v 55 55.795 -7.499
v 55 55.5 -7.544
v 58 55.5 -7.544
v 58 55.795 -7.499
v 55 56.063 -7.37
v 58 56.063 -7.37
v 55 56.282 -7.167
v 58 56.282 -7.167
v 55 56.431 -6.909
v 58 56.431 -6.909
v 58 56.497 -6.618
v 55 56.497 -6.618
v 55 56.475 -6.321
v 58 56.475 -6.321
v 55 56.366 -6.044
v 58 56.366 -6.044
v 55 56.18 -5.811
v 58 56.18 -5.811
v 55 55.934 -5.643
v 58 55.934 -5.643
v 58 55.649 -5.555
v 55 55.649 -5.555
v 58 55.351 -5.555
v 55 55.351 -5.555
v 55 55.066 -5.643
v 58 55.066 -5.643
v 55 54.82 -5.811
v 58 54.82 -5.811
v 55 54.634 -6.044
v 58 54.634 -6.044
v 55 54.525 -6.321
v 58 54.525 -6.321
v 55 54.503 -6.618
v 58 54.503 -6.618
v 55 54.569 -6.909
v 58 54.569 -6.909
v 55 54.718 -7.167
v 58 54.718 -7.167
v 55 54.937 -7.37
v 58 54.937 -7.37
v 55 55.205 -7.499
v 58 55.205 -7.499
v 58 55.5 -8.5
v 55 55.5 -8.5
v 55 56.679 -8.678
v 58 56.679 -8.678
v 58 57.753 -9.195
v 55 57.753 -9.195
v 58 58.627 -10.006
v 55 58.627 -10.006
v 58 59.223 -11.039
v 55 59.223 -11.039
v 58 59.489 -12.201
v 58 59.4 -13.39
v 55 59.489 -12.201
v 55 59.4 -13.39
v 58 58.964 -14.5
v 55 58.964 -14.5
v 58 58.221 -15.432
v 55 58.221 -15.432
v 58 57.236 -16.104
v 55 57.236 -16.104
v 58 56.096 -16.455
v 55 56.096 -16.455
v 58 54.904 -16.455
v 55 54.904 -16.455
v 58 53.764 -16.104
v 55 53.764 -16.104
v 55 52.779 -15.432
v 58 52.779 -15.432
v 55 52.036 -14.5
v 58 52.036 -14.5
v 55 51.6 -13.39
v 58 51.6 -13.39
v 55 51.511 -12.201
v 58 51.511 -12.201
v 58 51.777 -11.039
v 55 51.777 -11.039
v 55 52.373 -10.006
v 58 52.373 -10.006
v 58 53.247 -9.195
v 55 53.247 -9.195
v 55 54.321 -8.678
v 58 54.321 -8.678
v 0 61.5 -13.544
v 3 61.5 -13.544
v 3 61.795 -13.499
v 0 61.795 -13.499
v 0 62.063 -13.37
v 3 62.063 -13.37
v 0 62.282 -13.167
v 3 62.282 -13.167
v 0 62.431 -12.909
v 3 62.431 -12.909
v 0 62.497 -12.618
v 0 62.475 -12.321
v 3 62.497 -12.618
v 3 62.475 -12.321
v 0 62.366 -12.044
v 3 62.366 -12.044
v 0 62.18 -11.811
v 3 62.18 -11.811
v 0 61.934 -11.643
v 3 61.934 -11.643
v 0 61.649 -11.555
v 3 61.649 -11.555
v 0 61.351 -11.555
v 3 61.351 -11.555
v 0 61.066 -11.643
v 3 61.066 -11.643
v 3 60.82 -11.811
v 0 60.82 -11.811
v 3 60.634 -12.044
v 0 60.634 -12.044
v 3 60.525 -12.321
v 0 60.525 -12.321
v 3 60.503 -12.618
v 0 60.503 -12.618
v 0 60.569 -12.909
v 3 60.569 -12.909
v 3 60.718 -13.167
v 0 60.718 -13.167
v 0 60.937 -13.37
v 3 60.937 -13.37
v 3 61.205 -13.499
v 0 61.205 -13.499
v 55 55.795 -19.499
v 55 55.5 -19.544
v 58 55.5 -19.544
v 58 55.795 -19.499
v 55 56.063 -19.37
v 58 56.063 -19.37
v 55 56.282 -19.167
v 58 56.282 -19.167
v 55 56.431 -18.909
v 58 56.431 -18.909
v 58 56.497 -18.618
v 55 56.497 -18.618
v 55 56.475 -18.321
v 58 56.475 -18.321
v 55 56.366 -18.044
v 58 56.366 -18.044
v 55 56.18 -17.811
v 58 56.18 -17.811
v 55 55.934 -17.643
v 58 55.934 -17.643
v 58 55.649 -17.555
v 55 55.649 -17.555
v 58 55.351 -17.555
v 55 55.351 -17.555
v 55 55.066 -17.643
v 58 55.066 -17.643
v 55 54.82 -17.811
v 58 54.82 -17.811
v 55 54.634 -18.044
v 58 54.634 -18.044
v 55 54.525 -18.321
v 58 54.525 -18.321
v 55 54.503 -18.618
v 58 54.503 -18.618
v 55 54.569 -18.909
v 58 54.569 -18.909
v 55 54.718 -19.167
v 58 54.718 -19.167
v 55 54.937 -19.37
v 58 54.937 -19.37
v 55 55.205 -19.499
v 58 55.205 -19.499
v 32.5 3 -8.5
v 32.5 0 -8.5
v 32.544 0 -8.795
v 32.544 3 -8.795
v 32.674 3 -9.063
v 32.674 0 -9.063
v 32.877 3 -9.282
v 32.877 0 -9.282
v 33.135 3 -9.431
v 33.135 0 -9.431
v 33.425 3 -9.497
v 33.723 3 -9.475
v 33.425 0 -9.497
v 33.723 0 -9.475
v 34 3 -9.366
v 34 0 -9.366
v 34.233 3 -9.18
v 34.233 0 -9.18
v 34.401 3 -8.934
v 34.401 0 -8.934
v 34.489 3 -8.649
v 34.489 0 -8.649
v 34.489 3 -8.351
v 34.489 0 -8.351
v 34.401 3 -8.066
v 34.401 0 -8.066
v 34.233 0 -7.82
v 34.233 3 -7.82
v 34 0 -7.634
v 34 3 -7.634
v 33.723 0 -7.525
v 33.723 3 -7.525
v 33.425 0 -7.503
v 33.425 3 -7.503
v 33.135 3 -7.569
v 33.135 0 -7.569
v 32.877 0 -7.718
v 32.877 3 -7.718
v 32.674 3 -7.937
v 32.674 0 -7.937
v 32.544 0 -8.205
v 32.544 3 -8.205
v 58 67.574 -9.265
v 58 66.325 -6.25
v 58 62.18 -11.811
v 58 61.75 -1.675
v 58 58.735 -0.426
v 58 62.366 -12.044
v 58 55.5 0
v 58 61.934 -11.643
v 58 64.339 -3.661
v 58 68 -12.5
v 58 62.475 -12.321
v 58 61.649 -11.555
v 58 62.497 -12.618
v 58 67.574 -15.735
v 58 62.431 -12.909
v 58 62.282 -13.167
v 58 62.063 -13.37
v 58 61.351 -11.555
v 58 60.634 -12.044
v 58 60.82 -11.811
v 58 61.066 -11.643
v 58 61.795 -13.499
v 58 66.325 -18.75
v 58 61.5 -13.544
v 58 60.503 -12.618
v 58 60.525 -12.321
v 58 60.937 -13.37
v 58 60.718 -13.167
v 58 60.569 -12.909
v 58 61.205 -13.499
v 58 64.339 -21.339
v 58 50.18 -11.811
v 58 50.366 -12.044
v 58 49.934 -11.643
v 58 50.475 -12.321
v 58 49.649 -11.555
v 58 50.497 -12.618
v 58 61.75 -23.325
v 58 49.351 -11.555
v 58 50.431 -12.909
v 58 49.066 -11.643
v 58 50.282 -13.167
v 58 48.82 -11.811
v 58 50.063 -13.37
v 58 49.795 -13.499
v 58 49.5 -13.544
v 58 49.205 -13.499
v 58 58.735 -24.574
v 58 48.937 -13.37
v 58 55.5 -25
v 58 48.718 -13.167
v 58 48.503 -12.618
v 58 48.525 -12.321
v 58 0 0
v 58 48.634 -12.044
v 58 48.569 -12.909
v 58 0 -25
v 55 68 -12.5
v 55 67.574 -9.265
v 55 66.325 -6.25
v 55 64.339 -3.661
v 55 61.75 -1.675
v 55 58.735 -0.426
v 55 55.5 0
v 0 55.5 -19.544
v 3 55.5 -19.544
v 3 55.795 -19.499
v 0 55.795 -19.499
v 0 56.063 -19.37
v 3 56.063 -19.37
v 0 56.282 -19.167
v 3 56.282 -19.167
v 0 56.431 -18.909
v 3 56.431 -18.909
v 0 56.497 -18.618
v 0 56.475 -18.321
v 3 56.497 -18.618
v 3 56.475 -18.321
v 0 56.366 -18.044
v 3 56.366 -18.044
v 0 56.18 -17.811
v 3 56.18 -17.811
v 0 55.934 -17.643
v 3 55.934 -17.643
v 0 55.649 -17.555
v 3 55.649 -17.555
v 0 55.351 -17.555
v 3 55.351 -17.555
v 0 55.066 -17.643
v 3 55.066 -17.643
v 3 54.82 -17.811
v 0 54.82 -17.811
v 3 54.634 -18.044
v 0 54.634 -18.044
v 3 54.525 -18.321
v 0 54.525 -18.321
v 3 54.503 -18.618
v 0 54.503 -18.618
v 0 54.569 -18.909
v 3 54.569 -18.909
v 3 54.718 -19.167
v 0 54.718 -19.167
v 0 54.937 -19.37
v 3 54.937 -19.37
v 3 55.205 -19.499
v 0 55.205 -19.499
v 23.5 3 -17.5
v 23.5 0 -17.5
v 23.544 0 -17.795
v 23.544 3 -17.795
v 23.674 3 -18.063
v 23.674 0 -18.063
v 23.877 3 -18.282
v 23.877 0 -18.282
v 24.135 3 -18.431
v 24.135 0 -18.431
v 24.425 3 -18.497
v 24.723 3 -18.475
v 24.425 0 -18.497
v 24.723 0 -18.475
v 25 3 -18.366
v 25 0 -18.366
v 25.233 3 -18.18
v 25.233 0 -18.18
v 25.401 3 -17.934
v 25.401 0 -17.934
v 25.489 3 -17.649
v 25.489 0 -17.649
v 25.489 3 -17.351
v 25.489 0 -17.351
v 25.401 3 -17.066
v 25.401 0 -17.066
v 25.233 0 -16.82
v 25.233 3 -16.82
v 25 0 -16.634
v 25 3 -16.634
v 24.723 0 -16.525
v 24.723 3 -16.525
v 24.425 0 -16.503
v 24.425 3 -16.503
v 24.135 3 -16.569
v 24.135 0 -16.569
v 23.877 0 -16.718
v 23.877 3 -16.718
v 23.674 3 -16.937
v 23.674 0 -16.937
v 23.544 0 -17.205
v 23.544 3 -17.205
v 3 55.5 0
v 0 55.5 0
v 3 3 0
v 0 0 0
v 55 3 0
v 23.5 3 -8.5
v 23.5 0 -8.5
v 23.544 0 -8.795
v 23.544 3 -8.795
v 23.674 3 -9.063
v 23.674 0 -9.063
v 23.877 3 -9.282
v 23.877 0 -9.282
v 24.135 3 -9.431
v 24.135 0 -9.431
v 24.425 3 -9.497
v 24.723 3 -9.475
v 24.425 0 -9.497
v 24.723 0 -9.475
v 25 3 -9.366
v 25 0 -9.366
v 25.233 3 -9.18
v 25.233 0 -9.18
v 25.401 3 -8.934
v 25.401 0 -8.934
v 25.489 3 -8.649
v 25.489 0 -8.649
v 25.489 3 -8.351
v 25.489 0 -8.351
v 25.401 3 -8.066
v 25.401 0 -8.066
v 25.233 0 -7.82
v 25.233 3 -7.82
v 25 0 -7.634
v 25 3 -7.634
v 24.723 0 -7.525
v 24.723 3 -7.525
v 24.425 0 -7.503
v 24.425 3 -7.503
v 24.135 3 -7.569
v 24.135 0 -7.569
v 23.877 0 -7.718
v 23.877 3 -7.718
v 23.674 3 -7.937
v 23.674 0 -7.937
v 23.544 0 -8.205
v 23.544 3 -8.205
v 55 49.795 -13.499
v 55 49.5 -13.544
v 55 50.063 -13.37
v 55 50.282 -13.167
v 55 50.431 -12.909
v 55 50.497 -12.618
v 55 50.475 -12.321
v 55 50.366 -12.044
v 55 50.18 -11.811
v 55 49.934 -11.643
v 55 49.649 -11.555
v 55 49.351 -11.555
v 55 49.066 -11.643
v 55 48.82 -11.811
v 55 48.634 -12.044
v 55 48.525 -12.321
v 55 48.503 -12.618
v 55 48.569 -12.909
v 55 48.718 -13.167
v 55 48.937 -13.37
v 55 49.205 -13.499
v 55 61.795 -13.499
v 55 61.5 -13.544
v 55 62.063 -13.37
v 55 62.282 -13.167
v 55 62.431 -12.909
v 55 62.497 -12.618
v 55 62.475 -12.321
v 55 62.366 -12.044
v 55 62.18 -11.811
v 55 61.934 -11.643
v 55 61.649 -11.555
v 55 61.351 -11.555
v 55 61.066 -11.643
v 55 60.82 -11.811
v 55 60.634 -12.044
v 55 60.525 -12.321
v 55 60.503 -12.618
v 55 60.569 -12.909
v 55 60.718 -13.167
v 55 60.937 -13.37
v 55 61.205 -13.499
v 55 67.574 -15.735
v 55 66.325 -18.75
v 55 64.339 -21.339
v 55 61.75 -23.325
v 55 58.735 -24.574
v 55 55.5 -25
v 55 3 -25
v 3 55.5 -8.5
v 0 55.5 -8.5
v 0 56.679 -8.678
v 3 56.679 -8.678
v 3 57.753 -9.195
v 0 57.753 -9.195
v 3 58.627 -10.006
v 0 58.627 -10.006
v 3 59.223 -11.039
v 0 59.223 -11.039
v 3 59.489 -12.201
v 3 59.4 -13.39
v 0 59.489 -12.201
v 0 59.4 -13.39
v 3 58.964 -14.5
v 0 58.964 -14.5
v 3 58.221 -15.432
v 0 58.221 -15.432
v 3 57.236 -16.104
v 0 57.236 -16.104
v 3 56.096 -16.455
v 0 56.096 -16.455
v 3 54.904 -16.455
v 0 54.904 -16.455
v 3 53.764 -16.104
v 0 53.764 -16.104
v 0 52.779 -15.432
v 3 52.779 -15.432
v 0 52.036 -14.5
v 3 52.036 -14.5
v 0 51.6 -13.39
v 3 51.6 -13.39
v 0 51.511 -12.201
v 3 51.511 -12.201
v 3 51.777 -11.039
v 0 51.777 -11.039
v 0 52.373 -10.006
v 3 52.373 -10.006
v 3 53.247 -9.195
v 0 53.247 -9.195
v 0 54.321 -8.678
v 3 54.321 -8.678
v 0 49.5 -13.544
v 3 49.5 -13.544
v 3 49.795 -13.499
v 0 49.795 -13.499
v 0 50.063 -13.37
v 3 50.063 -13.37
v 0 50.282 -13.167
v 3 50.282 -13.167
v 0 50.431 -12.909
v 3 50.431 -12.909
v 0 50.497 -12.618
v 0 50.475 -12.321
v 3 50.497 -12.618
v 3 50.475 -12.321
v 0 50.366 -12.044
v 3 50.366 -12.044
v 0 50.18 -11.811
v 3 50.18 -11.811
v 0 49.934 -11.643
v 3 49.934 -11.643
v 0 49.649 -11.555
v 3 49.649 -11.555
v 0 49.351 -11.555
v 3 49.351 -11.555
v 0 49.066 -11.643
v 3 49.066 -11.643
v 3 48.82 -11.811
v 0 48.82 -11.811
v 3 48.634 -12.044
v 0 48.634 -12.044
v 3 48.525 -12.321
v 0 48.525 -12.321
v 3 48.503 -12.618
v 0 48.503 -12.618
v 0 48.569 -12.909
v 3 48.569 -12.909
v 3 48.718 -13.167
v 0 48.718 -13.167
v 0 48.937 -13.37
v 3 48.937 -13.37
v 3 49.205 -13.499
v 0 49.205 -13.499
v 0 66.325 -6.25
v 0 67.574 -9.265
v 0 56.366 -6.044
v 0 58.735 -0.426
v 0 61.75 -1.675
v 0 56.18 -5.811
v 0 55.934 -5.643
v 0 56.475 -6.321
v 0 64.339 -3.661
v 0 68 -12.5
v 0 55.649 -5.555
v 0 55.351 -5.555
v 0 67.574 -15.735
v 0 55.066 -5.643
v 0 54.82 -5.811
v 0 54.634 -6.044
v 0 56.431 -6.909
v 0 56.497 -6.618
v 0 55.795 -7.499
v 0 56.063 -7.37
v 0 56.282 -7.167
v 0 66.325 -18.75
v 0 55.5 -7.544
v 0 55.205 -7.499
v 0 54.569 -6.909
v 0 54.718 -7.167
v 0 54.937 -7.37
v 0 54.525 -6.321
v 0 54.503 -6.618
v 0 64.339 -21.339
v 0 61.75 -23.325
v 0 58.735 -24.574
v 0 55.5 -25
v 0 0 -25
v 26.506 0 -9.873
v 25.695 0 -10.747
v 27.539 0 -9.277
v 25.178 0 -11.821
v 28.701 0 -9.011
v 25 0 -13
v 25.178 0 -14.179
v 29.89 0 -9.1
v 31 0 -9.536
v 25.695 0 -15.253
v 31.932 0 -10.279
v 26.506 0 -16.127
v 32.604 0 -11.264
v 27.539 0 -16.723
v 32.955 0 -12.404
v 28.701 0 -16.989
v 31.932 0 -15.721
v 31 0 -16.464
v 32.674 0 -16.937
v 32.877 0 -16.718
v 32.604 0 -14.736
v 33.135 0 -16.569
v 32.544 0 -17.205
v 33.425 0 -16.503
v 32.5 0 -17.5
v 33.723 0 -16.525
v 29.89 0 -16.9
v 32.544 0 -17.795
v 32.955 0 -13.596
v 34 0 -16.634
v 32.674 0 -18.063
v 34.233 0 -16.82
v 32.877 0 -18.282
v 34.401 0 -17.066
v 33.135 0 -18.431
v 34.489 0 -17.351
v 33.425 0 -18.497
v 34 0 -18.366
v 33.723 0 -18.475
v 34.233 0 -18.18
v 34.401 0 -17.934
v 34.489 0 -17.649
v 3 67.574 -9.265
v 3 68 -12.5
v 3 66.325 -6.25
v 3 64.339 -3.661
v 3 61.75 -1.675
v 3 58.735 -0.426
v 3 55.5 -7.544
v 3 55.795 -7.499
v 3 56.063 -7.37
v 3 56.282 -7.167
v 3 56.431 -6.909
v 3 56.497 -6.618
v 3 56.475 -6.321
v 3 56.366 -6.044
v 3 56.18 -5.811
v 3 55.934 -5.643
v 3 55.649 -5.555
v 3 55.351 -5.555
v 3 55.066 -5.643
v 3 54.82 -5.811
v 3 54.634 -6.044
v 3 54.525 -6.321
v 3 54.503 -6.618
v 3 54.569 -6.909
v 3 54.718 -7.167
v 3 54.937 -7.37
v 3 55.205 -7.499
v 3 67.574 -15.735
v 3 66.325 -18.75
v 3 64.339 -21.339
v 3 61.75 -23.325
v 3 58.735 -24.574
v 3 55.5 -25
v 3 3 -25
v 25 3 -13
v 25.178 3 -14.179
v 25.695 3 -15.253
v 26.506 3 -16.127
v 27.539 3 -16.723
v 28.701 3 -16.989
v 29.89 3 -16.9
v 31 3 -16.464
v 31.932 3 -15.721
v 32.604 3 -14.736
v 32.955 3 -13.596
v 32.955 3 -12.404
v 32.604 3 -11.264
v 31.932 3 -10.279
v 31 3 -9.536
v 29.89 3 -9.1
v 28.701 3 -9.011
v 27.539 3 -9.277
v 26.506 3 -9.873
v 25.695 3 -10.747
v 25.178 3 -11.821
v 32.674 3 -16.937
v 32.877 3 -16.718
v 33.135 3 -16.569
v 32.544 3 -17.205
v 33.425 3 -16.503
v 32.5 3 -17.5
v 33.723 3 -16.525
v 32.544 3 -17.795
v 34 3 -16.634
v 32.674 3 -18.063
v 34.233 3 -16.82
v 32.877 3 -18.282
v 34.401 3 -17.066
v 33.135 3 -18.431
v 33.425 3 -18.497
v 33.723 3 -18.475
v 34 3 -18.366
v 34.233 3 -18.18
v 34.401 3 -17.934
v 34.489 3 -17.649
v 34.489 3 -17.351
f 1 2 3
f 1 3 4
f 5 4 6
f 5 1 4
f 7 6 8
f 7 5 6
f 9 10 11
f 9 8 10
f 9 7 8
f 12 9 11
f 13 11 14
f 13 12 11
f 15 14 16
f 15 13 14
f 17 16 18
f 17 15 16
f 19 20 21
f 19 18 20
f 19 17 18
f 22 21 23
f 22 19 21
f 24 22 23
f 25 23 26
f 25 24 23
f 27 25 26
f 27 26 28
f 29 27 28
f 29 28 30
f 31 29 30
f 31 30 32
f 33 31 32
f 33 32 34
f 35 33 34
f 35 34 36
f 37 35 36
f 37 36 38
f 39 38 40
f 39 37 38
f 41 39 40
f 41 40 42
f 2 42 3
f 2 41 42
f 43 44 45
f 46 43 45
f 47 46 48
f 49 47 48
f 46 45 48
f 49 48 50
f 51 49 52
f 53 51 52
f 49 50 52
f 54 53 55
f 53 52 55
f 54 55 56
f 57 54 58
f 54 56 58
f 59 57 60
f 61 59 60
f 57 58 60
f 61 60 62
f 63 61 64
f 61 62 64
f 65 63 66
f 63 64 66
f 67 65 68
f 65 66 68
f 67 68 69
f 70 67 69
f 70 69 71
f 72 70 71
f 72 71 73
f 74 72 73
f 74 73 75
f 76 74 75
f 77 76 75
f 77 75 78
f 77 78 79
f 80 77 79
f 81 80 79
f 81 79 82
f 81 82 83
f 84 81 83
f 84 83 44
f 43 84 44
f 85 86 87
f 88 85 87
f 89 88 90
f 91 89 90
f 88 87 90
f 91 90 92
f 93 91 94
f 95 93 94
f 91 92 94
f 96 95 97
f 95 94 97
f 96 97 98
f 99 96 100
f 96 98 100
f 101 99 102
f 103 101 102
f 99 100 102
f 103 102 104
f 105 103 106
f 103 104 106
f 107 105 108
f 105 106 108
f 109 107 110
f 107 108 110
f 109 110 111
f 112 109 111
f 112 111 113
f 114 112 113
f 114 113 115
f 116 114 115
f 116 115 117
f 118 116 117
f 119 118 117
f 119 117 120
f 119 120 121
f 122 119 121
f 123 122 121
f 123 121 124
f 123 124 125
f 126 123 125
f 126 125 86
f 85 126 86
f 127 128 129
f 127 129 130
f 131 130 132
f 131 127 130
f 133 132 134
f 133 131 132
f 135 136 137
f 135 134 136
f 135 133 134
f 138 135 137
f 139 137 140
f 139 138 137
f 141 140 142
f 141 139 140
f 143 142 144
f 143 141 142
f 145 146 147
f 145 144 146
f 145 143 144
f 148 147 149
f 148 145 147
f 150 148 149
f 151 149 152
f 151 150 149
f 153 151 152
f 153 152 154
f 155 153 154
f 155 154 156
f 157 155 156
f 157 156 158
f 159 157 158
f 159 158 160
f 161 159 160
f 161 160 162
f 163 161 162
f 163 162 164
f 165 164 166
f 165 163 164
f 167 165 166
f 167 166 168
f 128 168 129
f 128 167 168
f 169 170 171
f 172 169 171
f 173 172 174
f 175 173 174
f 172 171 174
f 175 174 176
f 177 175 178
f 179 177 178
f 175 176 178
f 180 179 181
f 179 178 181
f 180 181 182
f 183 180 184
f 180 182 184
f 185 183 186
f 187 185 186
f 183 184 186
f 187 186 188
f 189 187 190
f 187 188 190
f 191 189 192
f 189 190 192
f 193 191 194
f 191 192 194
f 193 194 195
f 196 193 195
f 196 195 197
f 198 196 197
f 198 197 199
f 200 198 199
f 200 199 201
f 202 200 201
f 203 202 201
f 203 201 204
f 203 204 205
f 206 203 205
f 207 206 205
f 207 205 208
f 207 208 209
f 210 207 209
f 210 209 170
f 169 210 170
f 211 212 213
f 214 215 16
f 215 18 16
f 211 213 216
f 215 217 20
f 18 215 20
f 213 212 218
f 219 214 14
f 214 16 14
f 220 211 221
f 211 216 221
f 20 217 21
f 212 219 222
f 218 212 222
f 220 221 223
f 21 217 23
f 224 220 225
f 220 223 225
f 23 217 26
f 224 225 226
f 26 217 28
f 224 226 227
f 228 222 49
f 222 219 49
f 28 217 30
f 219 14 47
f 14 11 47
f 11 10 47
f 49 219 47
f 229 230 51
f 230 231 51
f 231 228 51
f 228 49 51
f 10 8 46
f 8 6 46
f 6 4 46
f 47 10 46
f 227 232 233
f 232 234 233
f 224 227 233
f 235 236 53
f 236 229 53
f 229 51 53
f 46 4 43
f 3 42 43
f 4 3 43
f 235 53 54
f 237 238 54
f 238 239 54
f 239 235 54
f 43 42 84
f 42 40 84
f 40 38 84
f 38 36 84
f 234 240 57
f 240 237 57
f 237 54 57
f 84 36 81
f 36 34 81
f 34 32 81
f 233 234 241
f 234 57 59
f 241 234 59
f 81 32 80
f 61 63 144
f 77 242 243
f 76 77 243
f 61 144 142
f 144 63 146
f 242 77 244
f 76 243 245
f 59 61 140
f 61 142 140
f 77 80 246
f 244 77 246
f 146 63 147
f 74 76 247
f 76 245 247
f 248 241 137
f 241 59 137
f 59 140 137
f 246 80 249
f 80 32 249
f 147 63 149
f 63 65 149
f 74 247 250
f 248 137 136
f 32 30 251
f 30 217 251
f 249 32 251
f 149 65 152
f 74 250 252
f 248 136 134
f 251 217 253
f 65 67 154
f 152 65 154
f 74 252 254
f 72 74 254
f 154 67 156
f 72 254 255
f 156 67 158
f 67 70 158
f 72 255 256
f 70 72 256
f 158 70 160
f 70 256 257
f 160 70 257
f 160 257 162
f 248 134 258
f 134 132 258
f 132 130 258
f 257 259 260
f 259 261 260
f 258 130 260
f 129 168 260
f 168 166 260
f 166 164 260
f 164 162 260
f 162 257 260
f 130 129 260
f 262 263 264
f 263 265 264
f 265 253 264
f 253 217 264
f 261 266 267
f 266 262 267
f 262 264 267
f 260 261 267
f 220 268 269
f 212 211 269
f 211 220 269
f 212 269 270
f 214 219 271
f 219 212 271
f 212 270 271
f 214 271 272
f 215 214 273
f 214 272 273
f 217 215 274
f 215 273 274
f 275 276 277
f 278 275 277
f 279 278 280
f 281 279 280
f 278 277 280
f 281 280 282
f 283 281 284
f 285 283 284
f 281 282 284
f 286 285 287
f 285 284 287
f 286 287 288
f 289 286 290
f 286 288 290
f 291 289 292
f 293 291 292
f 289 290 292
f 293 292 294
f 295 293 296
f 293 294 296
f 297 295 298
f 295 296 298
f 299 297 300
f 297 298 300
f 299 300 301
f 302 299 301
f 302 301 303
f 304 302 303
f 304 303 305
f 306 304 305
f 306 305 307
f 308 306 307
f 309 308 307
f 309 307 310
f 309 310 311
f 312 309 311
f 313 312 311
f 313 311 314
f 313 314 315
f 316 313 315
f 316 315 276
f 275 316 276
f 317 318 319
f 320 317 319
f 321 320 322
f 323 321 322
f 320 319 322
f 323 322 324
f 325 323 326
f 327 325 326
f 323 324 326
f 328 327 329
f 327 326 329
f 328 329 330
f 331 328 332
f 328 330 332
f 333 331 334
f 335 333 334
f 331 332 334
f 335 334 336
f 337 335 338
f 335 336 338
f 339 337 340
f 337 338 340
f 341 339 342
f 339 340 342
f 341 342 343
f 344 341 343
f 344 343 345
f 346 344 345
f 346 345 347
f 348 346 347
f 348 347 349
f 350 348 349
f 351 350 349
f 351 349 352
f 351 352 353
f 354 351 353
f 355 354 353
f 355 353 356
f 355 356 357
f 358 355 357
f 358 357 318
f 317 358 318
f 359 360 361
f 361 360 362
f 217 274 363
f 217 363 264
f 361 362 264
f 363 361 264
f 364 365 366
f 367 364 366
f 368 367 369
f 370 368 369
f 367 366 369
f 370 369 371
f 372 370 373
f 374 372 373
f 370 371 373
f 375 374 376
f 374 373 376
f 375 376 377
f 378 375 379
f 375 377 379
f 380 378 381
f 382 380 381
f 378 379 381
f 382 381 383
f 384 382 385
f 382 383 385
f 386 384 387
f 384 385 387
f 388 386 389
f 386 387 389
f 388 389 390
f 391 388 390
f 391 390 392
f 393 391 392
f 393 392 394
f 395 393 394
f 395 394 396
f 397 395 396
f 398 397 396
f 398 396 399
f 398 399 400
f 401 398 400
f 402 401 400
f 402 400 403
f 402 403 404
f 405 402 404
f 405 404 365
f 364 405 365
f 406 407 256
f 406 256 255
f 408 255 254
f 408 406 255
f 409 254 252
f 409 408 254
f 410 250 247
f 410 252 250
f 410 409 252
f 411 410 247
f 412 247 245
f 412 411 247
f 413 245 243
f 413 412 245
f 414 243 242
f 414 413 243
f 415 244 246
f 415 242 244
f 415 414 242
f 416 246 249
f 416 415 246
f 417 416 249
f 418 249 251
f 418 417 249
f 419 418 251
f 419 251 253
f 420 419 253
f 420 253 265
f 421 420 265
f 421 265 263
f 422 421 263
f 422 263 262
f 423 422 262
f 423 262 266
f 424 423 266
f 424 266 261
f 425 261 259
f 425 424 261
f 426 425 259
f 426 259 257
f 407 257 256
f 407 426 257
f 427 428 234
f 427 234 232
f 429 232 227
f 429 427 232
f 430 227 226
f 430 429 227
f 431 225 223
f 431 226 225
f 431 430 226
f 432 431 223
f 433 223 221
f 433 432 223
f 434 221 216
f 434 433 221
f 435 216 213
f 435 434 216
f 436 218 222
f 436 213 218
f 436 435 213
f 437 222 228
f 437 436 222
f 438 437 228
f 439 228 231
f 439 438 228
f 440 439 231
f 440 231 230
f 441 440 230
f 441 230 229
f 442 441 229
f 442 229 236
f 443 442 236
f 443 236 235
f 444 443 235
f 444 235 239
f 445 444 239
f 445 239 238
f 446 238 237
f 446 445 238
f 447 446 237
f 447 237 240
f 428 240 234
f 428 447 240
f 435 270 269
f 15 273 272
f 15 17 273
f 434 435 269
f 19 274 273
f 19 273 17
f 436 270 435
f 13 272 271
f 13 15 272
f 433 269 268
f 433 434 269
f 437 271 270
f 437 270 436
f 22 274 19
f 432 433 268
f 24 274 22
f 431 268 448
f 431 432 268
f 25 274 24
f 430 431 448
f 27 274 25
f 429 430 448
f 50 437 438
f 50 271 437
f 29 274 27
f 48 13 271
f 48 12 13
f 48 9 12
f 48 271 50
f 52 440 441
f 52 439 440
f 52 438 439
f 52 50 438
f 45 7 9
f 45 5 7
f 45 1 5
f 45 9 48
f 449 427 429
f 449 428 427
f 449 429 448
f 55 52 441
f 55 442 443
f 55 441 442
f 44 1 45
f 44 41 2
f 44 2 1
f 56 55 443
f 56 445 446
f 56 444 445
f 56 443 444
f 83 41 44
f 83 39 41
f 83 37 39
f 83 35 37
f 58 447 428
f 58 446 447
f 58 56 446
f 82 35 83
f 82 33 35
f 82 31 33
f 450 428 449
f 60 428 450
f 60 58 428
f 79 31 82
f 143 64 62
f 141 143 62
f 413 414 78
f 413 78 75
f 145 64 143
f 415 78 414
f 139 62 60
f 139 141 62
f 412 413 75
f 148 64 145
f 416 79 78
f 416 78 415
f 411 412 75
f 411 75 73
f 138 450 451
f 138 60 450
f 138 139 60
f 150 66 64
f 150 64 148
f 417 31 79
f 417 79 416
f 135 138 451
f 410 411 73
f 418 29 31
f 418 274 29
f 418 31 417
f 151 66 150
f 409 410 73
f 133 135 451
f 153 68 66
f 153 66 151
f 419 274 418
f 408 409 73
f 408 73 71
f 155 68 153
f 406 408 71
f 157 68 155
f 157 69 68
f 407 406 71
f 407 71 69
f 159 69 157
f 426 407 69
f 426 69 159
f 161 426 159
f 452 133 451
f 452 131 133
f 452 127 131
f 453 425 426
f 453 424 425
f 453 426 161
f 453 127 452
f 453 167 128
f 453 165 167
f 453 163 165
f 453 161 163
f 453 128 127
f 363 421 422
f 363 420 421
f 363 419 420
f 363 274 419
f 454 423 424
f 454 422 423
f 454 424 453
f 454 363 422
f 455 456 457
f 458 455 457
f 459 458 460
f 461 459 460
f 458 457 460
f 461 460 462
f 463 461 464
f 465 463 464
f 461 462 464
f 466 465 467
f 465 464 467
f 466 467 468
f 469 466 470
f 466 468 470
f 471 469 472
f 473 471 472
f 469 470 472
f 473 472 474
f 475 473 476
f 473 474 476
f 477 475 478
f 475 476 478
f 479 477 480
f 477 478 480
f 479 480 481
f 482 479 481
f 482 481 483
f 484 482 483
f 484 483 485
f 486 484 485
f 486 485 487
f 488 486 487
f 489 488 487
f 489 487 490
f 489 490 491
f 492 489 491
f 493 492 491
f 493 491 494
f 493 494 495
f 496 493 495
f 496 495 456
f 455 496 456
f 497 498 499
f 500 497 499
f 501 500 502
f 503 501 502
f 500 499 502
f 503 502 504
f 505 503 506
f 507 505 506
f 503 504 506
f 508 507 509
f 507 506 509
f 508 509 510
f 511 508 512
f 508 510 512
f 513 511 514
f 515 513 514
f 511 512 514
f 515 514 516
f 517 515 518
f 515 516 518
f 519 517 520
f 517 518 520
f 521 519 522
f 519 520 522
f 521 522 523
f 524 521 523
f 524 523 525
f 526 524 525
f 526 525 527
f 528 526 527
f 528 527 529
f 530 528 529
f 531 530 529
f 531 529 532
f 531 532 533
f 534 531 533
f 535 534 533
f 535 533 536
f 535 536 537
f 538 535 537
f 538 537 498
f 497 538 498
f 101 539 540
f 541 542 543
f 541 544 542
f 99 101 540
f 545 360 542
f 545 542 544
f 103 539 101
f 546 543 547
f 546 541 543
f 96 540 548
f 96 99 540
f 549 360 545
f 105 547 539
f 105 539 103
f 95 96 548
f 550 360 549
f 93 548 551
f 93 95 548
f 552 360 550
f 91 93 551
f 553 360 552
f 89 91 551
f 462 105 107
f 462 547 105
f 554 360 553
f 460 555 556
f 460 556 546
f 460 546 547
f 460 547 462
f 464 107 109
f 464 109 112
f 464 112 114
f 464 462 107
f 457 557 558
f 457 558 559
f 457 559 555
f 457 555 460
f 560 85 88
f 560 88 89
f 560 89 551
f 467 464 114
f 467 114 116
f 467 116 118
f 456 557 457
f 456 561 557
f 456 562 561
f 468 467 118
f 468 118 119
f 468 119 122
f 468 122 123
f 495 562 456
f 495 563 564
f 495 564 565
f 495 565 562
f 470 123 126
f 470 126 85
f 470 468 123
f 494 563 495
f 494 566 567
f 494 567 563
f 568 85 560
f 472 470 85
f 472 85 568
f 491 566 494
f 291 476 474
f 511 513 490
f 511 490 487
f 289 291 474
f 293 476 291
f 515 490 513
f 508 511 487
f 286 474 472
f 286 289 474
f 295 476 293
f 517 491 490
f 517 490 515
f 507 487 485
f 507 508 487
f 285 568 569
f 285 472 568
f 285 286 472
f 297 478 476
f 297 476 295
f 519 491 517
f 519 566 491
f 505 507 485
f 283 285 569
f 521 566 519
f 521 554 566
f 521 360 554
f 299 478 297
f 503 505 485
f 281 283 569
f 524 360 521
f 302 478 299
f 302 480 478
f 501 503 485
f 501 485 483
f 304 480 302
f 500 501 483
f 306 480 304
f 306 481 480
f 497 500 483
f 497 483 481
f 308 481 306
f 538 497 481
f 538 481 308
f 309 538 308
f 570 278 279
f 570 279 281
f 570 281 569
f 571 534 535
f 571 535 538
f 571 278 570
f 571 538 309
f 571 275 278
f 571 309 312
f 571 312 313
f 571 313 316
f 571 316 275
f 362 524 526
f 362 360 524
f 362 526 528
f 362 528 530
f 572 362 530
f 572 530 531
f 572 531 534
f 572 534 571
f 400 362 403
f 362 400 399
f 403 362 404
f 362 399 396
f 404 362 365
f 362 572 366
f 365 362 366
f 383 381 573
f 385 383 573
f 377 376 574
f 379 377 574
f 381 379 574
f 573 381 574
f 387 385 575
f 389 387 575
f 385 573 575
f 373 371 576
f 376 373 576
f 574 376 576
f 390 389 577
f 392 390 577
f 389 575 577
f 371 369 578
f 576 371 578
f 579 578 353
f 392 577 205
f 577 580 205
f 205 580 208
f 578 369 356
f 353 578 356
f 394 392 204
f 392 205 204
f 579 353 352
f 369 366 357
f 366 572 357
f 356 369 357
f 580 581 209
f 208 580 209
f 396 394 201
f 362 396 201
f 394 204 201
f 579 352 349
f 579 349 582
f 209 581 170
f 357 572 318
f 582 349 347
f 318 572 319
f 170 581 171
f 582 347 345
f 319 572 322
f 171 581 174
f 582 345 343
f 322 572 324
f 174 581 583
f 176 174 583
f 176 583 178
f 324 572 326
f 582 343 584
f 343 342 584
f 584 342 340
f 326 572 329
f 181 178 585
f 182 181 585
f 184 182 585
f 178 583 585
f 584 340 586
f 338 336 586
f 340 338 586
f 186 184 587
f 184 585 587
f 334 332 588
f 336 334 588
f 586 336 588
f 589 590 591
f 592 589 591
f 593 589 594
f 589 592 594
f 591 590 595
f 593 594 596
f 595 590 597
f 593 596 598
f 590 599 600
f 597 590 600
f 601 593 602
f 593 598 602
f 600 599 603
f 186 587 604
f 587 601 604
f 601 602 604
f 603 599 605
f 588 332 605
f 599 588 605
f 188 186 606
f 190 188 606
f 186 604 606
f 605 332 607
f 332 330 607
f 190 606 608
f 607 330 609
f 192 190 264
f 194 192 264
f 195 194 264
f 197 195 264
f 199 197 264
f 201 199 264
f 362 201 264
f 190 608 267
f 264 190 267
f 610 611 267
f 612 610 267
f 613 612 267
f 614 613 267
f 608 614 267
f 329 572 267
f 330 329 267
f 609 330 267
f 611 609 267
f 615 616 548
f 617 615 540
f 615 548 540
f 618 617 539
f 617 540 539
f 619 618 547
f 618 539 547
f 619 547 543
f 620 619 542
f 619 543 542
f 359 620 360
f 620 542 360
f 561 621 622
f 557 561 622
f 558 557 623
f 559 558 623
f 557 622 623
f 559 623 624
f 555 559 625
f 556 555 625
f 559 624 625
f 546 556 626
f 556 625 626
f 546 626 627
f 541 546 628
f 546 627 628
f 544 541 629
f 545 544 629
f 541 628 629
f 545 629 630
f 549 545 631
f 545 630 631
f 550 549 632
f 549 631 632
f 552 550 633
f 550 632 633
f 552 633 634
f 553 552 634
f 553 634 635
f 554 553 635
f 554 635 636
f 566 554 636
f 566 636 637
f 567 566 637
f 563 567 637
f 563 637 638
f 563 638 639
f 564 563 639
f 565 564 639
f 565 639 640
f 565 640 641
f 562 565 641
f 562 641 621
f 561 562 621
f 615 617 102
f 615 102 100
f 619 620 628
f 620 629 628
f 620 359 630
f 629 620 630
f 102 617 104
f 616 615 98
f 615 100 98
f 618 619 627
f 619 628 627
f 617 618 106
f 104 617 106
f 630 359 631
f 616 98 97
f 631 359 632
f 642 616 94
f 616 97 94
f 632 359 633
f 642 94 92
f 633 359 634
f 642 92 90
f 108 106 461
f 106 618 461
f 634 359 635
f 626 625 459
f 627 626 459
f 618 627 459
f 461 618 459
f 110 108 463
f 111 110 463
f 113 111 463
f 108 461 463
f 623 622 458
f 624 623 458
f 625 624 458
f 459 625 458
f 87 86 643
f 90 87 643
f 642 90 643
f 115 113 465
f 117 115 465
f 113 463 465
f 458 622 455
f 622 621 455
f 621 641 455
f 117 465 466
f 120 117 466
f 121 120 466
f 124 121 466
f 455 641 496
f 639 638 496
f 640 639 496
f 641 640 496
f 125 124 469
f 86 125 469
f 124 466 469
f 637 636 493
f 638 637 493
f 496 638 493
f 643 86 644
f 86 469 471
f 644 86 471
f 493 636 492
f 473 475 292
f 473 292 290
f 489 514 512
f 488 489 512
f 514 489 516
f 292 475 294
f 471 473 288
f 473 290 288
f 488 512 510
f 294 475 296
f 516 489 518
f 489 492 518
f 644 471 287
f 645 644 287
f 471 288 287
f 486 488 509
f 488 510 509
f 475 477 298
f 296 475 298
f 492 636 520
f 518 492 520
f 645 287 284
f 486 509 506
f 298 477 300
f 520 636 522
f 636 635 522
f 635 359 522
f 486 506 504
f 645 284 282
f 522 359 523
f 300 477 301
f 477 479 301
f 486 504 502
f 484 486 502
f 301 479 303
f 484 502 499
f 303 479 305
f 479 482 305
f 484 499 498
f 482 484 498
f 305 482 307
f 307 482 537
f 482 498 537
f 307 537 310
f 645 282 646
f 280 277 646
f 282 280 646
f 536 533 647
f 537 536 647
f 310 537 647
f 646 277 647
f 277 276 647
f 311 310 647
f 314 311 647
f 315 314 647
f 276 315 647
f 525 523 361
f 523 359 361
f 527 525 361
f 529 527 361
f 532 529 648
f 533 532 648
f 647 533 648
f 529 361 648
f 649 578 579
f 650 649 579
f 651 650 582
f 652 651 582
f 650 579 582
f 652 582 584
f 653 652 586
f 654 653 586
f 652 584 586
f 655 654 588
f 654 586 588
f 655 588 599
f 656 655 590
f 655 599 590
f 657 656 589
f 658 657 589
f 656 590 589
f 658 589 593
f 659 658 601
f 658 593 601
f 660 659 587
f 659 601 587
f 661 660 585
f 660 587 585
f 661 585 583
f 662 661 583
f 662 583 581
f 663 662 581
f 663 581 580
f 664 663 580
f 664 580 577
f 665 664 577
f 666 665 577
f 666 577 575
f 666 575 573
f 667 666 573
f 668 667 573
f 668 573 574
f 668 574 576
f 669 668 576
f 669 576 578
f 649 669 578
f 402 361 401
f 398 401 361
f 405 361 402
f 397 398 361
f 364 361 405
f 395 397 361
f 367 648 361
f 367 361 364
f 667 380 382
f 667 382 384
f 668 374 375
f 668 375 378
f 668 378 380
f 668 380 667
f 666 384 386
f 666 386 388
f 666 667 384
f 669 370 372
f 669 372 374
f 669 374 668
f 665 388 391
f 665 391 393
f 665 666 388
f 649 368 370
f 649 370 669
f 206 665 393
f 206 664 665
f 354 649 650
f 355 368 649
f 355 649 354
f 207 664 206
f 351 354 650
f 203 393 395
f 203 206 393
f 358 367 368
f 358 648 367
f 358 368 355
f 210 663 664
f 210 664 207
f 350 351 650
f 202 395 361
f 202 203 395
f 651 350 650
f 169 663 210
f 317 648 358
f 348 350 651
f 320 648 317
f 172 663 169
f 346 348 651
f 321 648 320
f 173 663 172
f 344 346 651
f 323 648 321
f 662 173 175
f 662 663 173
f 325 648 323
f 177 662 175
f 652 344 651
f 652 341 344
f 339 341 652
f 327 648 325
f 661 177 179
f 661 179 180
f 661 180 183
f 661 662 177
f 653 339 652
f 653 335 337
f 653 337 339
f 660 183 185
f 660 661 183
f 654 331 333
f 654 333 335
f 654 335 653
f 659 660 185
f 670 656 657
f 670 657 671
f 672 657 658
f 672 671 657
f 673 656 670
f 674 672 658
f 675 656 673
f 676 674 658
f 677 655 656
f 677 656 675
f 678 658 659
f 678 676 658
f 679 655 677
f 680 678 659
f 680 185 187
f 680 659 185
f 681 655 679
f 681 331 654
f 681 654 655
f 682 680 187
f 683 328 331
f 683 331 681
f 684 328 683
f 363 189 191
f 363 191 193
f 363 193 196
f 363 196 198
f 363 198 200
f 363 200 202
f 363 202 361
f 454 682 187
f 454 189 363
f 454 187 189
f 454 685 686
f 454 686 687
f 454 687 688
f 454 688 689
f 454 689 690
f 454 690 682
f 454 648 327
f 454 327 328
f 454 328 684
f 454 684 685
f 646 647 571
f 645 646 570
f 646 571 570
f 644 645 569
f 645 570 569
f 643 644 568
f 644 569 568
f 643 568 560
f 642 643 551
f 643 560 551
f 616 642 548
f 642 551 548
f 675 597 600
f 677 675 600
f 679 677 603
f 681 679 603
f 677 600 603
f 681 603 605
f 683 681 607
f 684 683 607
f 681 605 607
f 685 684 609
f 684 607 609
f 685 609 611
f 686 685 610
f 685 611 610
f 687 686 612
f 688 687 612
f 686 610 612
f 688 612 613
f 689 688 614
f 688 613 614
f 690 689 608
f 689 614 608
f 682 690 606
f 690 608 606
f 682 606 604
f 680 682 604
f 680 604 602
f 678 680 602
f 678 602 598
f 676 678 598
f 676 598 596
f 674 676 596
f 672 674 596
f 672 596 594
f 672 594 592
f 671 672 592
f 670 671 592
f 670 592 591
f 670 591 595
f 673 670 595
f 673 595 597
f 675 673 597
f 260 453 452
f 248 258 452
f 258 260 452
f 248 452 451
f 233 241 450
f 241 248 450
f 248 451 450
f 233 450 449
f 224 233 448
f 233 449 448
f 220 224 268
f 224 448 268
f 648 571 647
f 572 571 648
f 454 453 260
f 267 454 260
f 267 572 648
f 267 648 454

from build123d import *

# Parameters (mm, degrees)
SKETCH1_W               = 58
SKETCH1_H               = 25
BOSS_EXTRUDE1_DEPTH     = 3
SKETCH2_W               = 3
SKETCH2_H               = 25
BOSS_EXTRUDE2_DEPTH     = 65
CUT_EXTRUDE1_DEPTH      = 65
SKETCH4_R               = 4
CUT_EXTRUDE2_DEPTH      = 65
SKETCH5_R               = 1
CUT_EXTRUDE3_DEPTH      = 56
CUT_EXTRUDE3_DEPTH_BACK = 4
CUT_EXTRUDE5_REACH      = 70
SKETCH7_R               = 4
SKETCH7_R_2             = 1


with BuildPart() as part:
    # Sketch1 → Boss-Extrude1 (new body)
    with BuildSketch(Plane(origin=(0, 0, 0), x_dir=(1, 0, 0), z_dir=(0, 1, 0))):
        with Locations((29, 12.5)):
            Rectangle(SKETCH1_W, SKETCH1_H)
    extrude(amount=BOSS_EXTRUDE1_DEPTH)

    # Sketch2 → Boss-Extrude2 (add)
    with BuildSketch(Plane(origin=(0, 3, 0), x_dir=(1, 0, 0), z_dir=(0, 1, 0))):
        with Locations((56.5, 12.5)):
            Rectangle(SKETCH2_W, SKETCH2_H)
        with Locations((1.5, 12.5)):
            Rectangle(SKETCH2_W, SKETCH2_H)
    extrude(amount=BOSS_EXTRUDE2_DEPTH)

    # Sketch3 → Cut-Extrude1 (cut)
    with BuildSketch(Plane.ZY):
        with BuildLine():
            Line((-25, 68), (-25, 55.5))
            ThreePointArc((-25, 55.5), (-21.338834765, 64.338834765), (-12.5, 68))
            Line((-12.5, 68), (-25, 68))
        make_face()
        with BuildLine():
            Line((0, 68), (-12.5, 68))
            ThreePointArc((-12.5, 68), (-3.661165235, 64.338834765), (0, 55.5))
            Line((0, 55.5), (0, 68))
        make_face()
    extrude(amount=-CUT_EXTRUDE1_DEPTH, mode=Mode.SUBTRACT)

    # Sketch4 → Cut-Extrude2 (cut)
    with BuildSketch(Plane.ZY):
        with Locations((-12.5, 55.5)):
            Circle(SKETCH4_R)
    extrude(amount=-CUT_EXTRUDE2_DEPTH, mode=Mode.SUBTRACT)

    # Sketch5 → Cut-Extrude3 (cut, two sides)
    with BuildSketch(Plane(origin=(3, 0, 0), x_dir=(0, 0, -1), z_dir=(1, 0, 0))) as cut_extrude3_sk:
        with Locations((12.543720091, 61.500000009)):
            Circle(SKETCH5_R)
        with Locations((18.543720091, 55.500000009)):
            Circle(SKETCH5_R)
        with Locations((6.543720091, 55.500000009)):
            Circle(SKETCH5_R)
        with Locations((12.543720091, 49.500000009)):
            Circle(SKETCH5_R)
    extrude(amount=CUT_EXTRUDE3_DEPTH, mode=Mode.SUBTRACT)
    extrude(cut_extrude3_sk.sketch, amount=-CUT_EXTRUDE3_DEPTH_BACK, mode=Mode.SUBTRACT)

    # Sketch7 → Cut-Extrude5 (cut, up to next)
    with BuildSketch(Plane(origin=(0, 0, 0), x_dir=(-1, 0, 0), z_dir=(0, -1, 0)), mode=Mode.PRIVATE) as cut_extrude5_sk1:
        with Locations((-29, 13)):
            Circle(SKETCH7_R)
    cut_extrude5_tool1 = extrude(cut_extrude5_sk1.sketch, amount=-CUT_EXTRUDE5_REACH, mode=Mode.PRIVATE) & part.part
    add(cut_extrude5_tool1.solids().sort_by_distance((29, 0, -13))[0], mode=Mode.SUBTRACT)
    # Sketch7 → Cut-Extrude5 (cut, up to next)
    with BuildSketch(Plane(origin=(0, 0, 0), x_dir=(-1, 0, 0), z_dir=(0, -1, 0)), mode=Mode.PRIVATE) as cut_extrude5_sk2:
        with Locations((-24.5, 17.5)):
            Circle(SKETCH7_R_2)
    cut_extrude5_tool2 = extrude(cut_extrude5_sk2.sketch, amount=-CUT_EXTRUDE5_REACH, mode=Mode.PRIVATE) & part.part
    add(cut_extrude5_tool2.solids().sort_by_distance((24.5, 0, -17.5))[0], mode=Mode.SUBTRACT)
    # Sketch7 → Cut-Extrude5 (cut, up to next)
    with BuildSketch(Plane(origin=(0, 0, 0), x_dir=(-1, 0, 0), z_dir=(0, -1, 0)), mode=Mode.PRIVATE) as cut_extrude5_sk3:
        with Locations((-33.5, 17.5)):
            Circle(SKETCH7_R_2)
    cut_extrude5_tool3 = extrude(cut_extrude5_sk3.sketch, amount=-CUT_EXTRUDE5_REACH, mode=Mode.PRIVATE) & part.part
    add(cut_extrude5_tool3.solids().sort_by_distance((33.5, 0, -17.5))[0], mode=Mode.SUBTRACT)
    # Sketch7 → Cut-Extrude5 (cut, up to next)
    with BuildSketch(Plane(origin=(0, 0, 0), x_dir=(-1, 0, 0), z_dir=(0, -1, 0)), mode=Mode.PRIVATE) as cut_extrude5_sk4:
        with Locations((-33.5, 8.5)):
            Circle(SKETCH7_R_2)
    cut_extrude5_tool4 = extrude(cut_extrude5_sk4.sketch, amount=-CUT_EXTRUDE5_REACH, mode=Mode.PRIVATE) & part.part
    add(cut_extrude5_tool4.solids().sort_by_distance((33.5, 0, -8.5))[0], mode=Mode.SUBTRACT)
    # Sketch7 → Cut-Extrude5 (cut, up to next)
    with BuildSketch(Plane(origin=(0, 0, 0), x_dir=(-1, 0, 0), z_dir=(0, -1, 0)), mode=Mode.PRIVATE) as cut_extrude5_sk5:
        with Locations((-24.5, 8.5)):
            Circle(SKETCH7_R_2)
    cut_extrude5_tool5 = extrude(cut_extrude5_sk5.sketch, amount=-CUT_EXTRUDE5_REACH, mode=Mode.PRIVATE) & part.part
    add(cut_extrude5_tool5.solids().sort_by_distance((24.5, 0, -8.5))[0], mode=Mode.SUBTRACT)


solid = part.part
